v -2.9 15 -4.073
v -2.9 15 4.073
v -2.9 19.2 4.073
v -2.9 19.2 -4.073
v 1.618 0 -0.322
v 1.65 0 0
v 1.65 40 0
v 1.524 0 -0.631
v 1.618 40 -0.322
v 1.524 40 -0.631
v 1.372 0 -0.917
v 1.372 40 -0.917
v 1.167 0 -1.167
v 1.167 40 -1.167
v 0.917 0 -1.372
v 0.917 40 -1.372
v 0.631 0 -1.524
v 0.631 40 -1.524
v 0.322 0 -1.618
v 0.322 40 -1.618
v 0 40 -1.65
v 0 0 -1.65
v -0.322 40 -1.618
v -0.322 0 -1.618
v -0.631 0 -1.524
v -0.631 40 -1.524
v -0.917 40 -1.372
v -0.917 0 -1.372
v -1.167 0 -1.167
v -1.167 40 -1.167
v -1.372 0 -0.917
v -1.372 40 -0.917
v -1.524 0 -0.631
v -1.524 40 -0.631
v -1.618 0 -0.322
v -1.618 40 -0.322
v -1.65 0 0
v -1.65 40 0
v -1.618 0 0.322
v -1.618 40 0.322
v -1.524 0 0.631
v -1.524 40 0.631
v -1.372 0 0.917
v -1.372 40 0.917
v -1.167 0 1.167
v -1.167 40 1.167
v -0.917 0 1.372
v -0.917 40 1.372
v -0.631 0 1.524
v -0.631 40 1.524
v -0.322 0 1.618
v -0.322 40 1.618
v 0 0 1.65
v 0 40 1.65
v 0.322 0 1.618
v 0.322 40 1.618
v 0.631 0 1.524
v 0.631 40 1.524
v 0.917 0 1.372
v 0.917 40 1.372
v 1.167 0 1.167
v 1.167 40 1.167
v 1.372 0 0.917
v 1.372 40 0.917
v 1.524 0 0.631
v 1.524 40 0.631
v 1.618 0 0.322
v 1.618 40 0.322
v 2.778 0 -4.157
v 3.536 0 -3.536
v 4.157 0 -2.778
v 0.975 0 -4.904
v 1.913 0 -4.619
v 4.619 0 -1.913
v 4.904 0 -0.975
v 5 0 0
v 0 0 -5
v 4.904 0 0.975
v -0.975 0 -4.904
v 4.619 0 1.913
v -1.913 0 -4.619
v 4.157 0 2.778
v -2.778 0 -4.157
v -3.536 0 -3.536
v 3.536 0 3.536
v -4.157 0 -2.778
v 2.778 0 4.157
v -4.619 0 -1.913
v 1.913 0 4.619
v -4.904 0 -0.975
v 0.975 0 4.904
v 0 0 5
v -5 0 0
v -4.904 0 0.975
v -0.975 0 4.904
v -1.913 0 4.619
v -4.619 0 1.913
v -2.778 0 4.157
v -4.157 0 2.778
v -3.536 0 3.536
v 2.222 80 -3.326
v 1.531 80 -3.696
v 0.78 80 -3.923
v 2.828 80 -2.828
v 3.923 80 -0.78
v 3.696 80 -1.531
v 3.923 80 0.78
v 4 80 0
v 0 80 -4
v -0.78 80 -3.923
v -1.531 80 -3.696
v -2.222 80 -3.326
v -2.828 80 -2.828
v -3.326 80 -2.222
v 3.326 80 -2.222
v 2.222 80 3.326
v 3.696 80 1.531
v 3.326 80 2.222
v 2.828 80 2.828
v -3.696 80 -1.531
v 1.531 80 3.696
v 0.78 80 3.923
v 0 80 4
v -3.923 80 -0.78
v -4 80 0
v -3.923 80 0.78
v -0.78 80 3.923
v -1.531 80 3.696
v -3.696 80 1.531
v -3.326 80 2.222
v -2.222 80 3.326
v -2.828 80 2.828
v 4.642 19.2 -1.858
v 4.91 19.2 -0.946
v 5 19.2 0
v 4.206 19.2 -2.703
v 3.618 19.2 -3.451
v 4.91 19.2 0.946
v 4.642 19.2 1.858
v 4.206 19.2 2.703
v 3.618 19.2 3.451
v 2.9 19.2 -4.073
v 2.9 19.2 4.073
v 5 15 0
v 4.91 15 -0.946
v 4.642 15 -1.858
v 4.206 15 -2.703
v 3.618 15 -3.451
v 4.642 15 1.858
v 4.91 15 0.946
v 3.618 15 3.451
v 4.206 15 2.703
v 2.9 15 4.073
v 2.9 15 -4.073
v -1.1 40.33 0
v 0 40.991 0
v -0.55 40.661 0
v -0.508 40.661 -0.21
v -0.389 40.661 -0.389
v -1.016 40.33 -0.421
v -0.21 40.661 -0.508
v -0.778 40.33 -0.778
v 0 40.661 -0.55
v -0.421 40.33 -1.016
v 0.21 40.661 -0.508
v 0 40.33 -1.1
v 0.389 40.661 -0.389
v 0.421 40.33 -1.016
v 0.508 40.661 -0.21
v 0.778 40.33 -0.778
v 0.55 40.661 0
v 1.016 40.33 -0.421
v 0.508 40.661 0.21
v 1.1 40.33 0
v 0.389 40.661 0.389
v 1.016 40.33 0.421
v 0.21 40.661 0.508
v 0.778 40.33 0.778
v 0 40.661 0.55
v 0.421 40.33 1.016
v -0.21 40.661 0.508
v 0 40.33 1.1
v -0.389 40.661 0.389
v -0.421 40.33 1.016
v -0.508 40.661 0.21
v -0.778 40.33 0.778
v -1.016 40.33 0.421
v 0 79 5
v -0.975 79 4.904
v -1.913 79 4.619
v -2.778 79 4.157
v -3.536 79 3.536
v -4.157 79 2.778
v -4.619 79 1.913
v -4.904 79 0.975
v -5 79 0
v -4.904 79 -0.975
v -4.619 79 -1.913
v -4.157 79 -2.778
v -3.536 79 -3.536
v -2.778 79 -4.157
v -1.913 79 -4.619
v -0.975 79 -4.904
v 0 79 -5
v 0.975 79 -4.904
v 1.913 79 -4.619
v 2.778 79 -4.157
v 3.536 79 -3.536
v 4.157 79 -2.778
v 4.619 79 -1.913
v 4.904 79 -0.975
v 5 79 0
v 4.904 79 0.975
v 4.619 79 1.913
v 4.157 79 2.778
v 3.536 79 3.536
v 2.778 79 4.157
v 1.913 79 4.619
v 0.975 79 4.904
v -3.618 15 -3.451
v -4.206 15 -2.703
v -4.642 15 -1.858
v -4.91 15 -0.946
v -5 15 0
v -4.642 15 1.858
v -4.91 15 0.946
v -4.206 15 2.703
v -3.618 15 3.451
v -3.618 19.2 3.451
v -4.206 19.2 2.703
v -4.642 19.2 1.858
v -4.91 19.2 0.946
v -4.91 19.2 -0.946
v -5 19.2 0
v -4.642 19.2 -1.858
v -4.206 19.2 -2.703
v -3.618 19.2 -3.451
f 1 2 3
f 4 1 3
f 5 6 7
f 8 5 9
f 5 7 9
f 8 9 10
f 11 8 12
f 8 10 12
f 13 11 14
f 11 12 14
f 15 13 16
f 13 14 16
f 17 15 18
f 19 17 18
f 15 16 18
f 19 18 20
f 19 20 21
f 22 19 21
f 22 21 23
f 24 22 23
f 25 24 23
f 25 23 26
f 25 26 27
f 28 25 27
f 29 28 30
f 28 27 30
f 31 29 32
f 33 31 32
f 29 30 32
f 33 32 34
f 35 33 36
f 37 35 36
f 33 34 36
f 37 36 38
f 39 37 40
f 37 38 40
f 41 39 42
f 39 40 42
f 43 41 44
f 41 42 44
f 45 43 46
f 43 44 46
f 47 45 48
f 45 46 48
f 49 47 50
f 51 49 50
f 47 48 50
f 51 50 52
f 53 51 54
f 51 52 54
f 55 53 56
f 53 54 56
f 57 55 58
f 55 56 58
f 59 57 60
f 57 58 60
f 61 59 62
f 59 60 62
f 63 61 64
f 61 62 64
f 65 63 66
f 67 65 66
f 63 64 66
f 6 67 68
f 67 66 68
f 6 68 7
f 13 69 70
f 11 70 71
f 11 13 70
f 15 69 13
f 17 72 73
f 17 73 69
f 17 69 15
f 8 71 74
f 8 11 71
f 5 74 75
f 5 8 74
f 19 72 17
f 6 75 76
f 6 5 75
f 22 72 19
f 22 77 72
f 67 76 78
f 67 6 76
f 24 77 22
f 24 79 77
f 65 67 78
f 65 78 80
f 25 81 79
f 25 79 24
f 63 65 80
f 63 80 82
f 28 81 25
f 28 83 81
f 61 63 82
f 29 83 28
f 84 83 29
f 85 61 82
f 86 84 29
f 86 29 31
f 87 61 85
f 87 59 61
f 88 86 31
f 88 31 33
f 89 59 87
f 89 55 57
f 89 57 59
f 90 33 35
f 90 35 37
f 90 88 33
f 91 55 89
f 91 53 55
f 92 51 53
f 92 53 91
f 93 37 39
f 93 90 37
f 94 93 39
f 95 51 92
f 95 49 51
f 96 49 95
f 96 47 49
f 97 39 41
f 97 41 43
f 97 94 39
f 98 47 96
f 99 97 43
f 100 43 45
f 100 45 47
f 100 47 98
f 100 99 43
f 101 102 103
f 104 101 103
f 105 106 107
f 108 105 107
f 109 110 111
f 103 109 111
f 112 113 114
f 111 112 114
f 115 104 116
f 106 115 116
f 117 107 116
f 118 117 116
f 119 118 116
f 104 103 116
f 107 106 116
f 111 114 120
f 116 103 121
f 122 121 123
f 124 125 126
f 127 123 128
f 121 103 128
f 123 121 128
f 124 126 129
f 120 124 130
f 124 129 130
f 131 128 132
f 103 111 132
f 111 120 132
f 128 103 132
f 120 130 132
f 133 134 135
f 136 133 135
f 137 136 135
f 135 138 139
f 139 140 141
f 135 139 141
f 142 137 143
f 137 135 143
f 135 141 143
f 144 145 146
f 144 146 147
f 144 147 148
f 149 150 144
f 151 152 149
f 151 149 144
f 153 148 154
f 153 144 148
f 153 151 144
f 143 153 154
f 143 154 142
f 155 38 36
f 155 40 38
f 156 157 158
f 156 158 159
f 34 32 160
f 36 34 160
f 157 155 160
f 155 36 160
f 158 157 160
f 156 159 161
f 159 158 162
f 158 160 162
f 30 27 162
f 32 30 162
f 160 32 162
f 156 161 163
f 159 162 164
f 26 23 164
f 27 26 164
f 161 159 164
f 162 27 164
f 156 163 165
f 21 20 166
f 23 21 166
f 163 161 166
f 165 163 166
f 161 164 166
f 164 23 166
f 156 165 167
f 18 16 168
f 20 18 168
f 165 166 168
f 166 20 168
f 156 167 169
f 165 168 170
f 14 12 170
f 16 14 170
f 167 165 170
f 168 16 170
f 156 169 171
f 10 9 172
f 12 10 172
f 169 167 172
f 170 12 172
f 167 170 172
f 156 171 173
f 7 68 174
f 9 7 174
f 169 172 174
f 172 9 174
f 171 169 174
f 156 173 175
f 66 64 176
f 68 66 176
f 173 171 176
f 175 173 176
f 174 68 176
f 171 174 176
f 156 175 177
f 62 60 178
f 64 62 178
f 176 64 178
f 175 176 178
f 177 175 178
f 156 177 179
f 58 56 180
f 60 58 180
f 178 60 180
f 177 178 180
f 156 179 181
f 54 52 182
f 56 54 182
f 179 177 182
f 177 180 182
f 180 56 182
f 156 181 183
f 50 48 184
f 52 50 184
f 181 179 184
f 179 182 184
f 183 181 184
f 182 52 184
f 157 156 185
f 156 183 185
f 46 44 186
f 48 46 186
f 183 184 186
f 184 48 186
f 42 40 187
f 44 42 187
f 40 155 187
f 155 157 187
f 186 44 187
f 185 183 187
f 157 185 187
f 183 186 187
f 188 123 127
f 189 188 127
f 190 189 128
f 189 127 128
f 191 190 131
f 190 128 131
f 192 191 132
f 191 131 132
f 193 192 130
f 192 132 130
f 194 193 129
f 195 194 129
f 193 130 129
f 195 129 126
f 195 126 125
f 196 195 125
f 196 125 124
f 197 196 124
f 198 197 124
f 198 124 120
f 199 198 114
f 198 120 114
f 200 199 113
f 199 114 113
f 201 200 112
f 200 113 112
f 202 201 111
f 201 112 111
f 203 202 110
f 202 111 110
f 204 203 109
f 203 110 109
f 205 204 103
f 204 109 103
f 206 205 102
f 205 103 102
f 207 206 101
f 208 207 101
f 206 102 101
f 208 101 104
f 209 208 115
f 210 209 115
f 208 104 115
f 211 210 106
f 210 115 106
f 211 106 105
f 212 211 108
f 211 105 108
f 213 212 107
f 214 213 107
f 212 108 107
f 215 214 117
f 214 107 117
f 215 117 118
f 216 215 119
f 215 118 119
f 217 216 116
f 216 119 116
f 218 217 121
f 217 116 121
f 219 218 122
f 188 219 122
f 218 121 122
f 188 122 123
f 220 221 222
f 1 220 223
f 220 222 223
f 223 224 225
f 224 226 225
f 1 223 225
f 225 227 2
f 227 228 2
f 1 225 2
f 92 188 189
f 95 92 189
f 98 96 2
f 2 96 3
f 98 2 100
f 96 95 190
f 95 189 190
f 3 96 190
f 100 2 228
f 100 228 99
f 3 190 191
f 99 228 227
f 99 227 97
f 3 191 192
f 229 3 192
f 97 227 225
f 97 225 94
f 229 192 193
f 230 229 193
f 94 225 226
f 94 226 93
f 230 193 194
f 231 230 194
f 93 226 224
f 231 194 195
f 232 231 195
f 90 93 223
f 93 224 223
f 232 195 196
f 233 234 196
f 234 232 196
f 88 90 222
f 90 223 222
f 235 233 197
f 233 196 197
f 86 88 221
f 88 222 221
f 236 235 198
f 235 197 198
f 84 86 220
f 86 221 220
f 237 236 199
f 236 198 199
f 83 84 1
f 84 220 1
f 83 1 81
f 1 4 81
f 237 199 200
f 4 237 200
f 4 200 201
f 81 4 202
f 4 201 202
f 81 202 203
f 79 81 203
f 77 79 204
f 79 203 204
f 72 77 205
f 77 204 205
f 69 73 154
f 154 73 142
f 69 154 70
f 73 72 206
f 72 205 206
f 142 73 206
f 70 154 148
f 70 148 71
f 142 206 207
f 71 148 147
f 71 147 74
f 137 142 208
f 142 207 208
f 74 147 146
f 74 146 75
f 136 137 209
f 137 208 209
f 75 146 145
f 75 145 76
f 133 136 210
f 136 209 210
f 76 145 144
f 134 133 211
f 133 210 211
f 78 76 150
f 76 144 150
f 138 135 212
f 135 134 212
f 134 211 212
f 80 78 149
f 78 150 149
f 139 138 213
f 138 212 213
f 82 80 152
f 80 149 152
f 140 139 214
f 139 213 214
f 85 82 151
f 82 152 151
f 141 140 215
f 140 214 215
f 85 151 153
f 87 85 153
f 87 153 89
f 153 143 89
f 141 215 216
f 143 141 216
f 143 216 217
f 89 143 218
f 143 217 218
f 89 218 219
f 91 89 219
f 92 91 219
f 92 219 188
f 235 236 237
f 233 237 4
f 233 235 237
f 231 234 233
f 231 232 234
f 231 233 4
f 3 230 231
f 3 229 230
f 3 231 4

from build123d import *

# Parameters (mm, degrees)
SKIZZE1_W                       = 5
SKIZZE1_H                       = 80
M4_GEWINDEBOHRUNG1_D            = 3.3
M4_GEWINDEBOHRUNG1_DEPTH        = 40
M4_GEWINDEBOHRUNG1_TIP          = 0.991420021
SKIZZE5_W                       = 4.2
SKIZZE5_H                       = 4.2
SCHNITT_LINEAR_AUSTRAGEN1_DEPTH = 10
FASE1_SIZE                      = 1


with BuildPart() as part:
    # Skizze1 → Rotation1 (revolve)
    with BuildSketch(Plane(origin=(0, 0, 0), x_dir=(0, 0, -1), z_dir=(1, 0, 0))):
        with Locations((-2.5, 40)):
            Rectangle(SKIZZE1_W, SKIZZE1_H)
    revolve(axis=Axis((0, 0, 0), (0, -1, 0)))

    # M4 Gewindebohrung1
    with Locations(Plane(origin=(0, 0, 0), x_dir=(-1, 0, 0), z_dir=(0, -1, 0))):
        with Locations((0, 0)):
            Hole(M4_GEWINDEBOHRUNG1_D / 2, depth=M4_GEWINDEBOHRUNG1_DEPTH)
            with Locations((0, 0, -(M4_GEWINDEBOHRUNG1_DEPTH + M4_GEWINDEBOHRUNG1_TIP / 2))):  # 118° drill point
                Cone(0, M4_GEWINDEBOHRUNG1_D / 2, M4_GEWINDEBOHRUNG1_TIP, mode=Mode.SUBTRACT)

    # Skizze5 → Schnitt-Linear austragen1 (cut, symmetric)
    with BuildSketch(Plane.XY):
        with Locations((-5, 17.1)):
            Rectangle(SKIZZE5_W, SKIZZE5_H)
    schnitt_linear_austragen1 = extrude(amount=SCHNITT_LINEAR_AUSTRAGEN1_DEPTH, both=True, mode=Mode.SUBTRACT)

    # Spiegeln1: Schnitt-Linear austragen1 across plane
    add(schnitt_linear_austragen1.mirror(Plane(origin=(0, 0, 0), x_dir=(0, 0, 1), z_dir=(1, 0, 0))), mode=Mode.SUBTRACT)

    # Fase1
    fase1_edges = [part.edges().sort_by_distance(p)[0] for p in [
        (0, 80, -5),
    ]]
    chamfer(fase1_edges, length=FASE1_SIZE)


solid = part.part
